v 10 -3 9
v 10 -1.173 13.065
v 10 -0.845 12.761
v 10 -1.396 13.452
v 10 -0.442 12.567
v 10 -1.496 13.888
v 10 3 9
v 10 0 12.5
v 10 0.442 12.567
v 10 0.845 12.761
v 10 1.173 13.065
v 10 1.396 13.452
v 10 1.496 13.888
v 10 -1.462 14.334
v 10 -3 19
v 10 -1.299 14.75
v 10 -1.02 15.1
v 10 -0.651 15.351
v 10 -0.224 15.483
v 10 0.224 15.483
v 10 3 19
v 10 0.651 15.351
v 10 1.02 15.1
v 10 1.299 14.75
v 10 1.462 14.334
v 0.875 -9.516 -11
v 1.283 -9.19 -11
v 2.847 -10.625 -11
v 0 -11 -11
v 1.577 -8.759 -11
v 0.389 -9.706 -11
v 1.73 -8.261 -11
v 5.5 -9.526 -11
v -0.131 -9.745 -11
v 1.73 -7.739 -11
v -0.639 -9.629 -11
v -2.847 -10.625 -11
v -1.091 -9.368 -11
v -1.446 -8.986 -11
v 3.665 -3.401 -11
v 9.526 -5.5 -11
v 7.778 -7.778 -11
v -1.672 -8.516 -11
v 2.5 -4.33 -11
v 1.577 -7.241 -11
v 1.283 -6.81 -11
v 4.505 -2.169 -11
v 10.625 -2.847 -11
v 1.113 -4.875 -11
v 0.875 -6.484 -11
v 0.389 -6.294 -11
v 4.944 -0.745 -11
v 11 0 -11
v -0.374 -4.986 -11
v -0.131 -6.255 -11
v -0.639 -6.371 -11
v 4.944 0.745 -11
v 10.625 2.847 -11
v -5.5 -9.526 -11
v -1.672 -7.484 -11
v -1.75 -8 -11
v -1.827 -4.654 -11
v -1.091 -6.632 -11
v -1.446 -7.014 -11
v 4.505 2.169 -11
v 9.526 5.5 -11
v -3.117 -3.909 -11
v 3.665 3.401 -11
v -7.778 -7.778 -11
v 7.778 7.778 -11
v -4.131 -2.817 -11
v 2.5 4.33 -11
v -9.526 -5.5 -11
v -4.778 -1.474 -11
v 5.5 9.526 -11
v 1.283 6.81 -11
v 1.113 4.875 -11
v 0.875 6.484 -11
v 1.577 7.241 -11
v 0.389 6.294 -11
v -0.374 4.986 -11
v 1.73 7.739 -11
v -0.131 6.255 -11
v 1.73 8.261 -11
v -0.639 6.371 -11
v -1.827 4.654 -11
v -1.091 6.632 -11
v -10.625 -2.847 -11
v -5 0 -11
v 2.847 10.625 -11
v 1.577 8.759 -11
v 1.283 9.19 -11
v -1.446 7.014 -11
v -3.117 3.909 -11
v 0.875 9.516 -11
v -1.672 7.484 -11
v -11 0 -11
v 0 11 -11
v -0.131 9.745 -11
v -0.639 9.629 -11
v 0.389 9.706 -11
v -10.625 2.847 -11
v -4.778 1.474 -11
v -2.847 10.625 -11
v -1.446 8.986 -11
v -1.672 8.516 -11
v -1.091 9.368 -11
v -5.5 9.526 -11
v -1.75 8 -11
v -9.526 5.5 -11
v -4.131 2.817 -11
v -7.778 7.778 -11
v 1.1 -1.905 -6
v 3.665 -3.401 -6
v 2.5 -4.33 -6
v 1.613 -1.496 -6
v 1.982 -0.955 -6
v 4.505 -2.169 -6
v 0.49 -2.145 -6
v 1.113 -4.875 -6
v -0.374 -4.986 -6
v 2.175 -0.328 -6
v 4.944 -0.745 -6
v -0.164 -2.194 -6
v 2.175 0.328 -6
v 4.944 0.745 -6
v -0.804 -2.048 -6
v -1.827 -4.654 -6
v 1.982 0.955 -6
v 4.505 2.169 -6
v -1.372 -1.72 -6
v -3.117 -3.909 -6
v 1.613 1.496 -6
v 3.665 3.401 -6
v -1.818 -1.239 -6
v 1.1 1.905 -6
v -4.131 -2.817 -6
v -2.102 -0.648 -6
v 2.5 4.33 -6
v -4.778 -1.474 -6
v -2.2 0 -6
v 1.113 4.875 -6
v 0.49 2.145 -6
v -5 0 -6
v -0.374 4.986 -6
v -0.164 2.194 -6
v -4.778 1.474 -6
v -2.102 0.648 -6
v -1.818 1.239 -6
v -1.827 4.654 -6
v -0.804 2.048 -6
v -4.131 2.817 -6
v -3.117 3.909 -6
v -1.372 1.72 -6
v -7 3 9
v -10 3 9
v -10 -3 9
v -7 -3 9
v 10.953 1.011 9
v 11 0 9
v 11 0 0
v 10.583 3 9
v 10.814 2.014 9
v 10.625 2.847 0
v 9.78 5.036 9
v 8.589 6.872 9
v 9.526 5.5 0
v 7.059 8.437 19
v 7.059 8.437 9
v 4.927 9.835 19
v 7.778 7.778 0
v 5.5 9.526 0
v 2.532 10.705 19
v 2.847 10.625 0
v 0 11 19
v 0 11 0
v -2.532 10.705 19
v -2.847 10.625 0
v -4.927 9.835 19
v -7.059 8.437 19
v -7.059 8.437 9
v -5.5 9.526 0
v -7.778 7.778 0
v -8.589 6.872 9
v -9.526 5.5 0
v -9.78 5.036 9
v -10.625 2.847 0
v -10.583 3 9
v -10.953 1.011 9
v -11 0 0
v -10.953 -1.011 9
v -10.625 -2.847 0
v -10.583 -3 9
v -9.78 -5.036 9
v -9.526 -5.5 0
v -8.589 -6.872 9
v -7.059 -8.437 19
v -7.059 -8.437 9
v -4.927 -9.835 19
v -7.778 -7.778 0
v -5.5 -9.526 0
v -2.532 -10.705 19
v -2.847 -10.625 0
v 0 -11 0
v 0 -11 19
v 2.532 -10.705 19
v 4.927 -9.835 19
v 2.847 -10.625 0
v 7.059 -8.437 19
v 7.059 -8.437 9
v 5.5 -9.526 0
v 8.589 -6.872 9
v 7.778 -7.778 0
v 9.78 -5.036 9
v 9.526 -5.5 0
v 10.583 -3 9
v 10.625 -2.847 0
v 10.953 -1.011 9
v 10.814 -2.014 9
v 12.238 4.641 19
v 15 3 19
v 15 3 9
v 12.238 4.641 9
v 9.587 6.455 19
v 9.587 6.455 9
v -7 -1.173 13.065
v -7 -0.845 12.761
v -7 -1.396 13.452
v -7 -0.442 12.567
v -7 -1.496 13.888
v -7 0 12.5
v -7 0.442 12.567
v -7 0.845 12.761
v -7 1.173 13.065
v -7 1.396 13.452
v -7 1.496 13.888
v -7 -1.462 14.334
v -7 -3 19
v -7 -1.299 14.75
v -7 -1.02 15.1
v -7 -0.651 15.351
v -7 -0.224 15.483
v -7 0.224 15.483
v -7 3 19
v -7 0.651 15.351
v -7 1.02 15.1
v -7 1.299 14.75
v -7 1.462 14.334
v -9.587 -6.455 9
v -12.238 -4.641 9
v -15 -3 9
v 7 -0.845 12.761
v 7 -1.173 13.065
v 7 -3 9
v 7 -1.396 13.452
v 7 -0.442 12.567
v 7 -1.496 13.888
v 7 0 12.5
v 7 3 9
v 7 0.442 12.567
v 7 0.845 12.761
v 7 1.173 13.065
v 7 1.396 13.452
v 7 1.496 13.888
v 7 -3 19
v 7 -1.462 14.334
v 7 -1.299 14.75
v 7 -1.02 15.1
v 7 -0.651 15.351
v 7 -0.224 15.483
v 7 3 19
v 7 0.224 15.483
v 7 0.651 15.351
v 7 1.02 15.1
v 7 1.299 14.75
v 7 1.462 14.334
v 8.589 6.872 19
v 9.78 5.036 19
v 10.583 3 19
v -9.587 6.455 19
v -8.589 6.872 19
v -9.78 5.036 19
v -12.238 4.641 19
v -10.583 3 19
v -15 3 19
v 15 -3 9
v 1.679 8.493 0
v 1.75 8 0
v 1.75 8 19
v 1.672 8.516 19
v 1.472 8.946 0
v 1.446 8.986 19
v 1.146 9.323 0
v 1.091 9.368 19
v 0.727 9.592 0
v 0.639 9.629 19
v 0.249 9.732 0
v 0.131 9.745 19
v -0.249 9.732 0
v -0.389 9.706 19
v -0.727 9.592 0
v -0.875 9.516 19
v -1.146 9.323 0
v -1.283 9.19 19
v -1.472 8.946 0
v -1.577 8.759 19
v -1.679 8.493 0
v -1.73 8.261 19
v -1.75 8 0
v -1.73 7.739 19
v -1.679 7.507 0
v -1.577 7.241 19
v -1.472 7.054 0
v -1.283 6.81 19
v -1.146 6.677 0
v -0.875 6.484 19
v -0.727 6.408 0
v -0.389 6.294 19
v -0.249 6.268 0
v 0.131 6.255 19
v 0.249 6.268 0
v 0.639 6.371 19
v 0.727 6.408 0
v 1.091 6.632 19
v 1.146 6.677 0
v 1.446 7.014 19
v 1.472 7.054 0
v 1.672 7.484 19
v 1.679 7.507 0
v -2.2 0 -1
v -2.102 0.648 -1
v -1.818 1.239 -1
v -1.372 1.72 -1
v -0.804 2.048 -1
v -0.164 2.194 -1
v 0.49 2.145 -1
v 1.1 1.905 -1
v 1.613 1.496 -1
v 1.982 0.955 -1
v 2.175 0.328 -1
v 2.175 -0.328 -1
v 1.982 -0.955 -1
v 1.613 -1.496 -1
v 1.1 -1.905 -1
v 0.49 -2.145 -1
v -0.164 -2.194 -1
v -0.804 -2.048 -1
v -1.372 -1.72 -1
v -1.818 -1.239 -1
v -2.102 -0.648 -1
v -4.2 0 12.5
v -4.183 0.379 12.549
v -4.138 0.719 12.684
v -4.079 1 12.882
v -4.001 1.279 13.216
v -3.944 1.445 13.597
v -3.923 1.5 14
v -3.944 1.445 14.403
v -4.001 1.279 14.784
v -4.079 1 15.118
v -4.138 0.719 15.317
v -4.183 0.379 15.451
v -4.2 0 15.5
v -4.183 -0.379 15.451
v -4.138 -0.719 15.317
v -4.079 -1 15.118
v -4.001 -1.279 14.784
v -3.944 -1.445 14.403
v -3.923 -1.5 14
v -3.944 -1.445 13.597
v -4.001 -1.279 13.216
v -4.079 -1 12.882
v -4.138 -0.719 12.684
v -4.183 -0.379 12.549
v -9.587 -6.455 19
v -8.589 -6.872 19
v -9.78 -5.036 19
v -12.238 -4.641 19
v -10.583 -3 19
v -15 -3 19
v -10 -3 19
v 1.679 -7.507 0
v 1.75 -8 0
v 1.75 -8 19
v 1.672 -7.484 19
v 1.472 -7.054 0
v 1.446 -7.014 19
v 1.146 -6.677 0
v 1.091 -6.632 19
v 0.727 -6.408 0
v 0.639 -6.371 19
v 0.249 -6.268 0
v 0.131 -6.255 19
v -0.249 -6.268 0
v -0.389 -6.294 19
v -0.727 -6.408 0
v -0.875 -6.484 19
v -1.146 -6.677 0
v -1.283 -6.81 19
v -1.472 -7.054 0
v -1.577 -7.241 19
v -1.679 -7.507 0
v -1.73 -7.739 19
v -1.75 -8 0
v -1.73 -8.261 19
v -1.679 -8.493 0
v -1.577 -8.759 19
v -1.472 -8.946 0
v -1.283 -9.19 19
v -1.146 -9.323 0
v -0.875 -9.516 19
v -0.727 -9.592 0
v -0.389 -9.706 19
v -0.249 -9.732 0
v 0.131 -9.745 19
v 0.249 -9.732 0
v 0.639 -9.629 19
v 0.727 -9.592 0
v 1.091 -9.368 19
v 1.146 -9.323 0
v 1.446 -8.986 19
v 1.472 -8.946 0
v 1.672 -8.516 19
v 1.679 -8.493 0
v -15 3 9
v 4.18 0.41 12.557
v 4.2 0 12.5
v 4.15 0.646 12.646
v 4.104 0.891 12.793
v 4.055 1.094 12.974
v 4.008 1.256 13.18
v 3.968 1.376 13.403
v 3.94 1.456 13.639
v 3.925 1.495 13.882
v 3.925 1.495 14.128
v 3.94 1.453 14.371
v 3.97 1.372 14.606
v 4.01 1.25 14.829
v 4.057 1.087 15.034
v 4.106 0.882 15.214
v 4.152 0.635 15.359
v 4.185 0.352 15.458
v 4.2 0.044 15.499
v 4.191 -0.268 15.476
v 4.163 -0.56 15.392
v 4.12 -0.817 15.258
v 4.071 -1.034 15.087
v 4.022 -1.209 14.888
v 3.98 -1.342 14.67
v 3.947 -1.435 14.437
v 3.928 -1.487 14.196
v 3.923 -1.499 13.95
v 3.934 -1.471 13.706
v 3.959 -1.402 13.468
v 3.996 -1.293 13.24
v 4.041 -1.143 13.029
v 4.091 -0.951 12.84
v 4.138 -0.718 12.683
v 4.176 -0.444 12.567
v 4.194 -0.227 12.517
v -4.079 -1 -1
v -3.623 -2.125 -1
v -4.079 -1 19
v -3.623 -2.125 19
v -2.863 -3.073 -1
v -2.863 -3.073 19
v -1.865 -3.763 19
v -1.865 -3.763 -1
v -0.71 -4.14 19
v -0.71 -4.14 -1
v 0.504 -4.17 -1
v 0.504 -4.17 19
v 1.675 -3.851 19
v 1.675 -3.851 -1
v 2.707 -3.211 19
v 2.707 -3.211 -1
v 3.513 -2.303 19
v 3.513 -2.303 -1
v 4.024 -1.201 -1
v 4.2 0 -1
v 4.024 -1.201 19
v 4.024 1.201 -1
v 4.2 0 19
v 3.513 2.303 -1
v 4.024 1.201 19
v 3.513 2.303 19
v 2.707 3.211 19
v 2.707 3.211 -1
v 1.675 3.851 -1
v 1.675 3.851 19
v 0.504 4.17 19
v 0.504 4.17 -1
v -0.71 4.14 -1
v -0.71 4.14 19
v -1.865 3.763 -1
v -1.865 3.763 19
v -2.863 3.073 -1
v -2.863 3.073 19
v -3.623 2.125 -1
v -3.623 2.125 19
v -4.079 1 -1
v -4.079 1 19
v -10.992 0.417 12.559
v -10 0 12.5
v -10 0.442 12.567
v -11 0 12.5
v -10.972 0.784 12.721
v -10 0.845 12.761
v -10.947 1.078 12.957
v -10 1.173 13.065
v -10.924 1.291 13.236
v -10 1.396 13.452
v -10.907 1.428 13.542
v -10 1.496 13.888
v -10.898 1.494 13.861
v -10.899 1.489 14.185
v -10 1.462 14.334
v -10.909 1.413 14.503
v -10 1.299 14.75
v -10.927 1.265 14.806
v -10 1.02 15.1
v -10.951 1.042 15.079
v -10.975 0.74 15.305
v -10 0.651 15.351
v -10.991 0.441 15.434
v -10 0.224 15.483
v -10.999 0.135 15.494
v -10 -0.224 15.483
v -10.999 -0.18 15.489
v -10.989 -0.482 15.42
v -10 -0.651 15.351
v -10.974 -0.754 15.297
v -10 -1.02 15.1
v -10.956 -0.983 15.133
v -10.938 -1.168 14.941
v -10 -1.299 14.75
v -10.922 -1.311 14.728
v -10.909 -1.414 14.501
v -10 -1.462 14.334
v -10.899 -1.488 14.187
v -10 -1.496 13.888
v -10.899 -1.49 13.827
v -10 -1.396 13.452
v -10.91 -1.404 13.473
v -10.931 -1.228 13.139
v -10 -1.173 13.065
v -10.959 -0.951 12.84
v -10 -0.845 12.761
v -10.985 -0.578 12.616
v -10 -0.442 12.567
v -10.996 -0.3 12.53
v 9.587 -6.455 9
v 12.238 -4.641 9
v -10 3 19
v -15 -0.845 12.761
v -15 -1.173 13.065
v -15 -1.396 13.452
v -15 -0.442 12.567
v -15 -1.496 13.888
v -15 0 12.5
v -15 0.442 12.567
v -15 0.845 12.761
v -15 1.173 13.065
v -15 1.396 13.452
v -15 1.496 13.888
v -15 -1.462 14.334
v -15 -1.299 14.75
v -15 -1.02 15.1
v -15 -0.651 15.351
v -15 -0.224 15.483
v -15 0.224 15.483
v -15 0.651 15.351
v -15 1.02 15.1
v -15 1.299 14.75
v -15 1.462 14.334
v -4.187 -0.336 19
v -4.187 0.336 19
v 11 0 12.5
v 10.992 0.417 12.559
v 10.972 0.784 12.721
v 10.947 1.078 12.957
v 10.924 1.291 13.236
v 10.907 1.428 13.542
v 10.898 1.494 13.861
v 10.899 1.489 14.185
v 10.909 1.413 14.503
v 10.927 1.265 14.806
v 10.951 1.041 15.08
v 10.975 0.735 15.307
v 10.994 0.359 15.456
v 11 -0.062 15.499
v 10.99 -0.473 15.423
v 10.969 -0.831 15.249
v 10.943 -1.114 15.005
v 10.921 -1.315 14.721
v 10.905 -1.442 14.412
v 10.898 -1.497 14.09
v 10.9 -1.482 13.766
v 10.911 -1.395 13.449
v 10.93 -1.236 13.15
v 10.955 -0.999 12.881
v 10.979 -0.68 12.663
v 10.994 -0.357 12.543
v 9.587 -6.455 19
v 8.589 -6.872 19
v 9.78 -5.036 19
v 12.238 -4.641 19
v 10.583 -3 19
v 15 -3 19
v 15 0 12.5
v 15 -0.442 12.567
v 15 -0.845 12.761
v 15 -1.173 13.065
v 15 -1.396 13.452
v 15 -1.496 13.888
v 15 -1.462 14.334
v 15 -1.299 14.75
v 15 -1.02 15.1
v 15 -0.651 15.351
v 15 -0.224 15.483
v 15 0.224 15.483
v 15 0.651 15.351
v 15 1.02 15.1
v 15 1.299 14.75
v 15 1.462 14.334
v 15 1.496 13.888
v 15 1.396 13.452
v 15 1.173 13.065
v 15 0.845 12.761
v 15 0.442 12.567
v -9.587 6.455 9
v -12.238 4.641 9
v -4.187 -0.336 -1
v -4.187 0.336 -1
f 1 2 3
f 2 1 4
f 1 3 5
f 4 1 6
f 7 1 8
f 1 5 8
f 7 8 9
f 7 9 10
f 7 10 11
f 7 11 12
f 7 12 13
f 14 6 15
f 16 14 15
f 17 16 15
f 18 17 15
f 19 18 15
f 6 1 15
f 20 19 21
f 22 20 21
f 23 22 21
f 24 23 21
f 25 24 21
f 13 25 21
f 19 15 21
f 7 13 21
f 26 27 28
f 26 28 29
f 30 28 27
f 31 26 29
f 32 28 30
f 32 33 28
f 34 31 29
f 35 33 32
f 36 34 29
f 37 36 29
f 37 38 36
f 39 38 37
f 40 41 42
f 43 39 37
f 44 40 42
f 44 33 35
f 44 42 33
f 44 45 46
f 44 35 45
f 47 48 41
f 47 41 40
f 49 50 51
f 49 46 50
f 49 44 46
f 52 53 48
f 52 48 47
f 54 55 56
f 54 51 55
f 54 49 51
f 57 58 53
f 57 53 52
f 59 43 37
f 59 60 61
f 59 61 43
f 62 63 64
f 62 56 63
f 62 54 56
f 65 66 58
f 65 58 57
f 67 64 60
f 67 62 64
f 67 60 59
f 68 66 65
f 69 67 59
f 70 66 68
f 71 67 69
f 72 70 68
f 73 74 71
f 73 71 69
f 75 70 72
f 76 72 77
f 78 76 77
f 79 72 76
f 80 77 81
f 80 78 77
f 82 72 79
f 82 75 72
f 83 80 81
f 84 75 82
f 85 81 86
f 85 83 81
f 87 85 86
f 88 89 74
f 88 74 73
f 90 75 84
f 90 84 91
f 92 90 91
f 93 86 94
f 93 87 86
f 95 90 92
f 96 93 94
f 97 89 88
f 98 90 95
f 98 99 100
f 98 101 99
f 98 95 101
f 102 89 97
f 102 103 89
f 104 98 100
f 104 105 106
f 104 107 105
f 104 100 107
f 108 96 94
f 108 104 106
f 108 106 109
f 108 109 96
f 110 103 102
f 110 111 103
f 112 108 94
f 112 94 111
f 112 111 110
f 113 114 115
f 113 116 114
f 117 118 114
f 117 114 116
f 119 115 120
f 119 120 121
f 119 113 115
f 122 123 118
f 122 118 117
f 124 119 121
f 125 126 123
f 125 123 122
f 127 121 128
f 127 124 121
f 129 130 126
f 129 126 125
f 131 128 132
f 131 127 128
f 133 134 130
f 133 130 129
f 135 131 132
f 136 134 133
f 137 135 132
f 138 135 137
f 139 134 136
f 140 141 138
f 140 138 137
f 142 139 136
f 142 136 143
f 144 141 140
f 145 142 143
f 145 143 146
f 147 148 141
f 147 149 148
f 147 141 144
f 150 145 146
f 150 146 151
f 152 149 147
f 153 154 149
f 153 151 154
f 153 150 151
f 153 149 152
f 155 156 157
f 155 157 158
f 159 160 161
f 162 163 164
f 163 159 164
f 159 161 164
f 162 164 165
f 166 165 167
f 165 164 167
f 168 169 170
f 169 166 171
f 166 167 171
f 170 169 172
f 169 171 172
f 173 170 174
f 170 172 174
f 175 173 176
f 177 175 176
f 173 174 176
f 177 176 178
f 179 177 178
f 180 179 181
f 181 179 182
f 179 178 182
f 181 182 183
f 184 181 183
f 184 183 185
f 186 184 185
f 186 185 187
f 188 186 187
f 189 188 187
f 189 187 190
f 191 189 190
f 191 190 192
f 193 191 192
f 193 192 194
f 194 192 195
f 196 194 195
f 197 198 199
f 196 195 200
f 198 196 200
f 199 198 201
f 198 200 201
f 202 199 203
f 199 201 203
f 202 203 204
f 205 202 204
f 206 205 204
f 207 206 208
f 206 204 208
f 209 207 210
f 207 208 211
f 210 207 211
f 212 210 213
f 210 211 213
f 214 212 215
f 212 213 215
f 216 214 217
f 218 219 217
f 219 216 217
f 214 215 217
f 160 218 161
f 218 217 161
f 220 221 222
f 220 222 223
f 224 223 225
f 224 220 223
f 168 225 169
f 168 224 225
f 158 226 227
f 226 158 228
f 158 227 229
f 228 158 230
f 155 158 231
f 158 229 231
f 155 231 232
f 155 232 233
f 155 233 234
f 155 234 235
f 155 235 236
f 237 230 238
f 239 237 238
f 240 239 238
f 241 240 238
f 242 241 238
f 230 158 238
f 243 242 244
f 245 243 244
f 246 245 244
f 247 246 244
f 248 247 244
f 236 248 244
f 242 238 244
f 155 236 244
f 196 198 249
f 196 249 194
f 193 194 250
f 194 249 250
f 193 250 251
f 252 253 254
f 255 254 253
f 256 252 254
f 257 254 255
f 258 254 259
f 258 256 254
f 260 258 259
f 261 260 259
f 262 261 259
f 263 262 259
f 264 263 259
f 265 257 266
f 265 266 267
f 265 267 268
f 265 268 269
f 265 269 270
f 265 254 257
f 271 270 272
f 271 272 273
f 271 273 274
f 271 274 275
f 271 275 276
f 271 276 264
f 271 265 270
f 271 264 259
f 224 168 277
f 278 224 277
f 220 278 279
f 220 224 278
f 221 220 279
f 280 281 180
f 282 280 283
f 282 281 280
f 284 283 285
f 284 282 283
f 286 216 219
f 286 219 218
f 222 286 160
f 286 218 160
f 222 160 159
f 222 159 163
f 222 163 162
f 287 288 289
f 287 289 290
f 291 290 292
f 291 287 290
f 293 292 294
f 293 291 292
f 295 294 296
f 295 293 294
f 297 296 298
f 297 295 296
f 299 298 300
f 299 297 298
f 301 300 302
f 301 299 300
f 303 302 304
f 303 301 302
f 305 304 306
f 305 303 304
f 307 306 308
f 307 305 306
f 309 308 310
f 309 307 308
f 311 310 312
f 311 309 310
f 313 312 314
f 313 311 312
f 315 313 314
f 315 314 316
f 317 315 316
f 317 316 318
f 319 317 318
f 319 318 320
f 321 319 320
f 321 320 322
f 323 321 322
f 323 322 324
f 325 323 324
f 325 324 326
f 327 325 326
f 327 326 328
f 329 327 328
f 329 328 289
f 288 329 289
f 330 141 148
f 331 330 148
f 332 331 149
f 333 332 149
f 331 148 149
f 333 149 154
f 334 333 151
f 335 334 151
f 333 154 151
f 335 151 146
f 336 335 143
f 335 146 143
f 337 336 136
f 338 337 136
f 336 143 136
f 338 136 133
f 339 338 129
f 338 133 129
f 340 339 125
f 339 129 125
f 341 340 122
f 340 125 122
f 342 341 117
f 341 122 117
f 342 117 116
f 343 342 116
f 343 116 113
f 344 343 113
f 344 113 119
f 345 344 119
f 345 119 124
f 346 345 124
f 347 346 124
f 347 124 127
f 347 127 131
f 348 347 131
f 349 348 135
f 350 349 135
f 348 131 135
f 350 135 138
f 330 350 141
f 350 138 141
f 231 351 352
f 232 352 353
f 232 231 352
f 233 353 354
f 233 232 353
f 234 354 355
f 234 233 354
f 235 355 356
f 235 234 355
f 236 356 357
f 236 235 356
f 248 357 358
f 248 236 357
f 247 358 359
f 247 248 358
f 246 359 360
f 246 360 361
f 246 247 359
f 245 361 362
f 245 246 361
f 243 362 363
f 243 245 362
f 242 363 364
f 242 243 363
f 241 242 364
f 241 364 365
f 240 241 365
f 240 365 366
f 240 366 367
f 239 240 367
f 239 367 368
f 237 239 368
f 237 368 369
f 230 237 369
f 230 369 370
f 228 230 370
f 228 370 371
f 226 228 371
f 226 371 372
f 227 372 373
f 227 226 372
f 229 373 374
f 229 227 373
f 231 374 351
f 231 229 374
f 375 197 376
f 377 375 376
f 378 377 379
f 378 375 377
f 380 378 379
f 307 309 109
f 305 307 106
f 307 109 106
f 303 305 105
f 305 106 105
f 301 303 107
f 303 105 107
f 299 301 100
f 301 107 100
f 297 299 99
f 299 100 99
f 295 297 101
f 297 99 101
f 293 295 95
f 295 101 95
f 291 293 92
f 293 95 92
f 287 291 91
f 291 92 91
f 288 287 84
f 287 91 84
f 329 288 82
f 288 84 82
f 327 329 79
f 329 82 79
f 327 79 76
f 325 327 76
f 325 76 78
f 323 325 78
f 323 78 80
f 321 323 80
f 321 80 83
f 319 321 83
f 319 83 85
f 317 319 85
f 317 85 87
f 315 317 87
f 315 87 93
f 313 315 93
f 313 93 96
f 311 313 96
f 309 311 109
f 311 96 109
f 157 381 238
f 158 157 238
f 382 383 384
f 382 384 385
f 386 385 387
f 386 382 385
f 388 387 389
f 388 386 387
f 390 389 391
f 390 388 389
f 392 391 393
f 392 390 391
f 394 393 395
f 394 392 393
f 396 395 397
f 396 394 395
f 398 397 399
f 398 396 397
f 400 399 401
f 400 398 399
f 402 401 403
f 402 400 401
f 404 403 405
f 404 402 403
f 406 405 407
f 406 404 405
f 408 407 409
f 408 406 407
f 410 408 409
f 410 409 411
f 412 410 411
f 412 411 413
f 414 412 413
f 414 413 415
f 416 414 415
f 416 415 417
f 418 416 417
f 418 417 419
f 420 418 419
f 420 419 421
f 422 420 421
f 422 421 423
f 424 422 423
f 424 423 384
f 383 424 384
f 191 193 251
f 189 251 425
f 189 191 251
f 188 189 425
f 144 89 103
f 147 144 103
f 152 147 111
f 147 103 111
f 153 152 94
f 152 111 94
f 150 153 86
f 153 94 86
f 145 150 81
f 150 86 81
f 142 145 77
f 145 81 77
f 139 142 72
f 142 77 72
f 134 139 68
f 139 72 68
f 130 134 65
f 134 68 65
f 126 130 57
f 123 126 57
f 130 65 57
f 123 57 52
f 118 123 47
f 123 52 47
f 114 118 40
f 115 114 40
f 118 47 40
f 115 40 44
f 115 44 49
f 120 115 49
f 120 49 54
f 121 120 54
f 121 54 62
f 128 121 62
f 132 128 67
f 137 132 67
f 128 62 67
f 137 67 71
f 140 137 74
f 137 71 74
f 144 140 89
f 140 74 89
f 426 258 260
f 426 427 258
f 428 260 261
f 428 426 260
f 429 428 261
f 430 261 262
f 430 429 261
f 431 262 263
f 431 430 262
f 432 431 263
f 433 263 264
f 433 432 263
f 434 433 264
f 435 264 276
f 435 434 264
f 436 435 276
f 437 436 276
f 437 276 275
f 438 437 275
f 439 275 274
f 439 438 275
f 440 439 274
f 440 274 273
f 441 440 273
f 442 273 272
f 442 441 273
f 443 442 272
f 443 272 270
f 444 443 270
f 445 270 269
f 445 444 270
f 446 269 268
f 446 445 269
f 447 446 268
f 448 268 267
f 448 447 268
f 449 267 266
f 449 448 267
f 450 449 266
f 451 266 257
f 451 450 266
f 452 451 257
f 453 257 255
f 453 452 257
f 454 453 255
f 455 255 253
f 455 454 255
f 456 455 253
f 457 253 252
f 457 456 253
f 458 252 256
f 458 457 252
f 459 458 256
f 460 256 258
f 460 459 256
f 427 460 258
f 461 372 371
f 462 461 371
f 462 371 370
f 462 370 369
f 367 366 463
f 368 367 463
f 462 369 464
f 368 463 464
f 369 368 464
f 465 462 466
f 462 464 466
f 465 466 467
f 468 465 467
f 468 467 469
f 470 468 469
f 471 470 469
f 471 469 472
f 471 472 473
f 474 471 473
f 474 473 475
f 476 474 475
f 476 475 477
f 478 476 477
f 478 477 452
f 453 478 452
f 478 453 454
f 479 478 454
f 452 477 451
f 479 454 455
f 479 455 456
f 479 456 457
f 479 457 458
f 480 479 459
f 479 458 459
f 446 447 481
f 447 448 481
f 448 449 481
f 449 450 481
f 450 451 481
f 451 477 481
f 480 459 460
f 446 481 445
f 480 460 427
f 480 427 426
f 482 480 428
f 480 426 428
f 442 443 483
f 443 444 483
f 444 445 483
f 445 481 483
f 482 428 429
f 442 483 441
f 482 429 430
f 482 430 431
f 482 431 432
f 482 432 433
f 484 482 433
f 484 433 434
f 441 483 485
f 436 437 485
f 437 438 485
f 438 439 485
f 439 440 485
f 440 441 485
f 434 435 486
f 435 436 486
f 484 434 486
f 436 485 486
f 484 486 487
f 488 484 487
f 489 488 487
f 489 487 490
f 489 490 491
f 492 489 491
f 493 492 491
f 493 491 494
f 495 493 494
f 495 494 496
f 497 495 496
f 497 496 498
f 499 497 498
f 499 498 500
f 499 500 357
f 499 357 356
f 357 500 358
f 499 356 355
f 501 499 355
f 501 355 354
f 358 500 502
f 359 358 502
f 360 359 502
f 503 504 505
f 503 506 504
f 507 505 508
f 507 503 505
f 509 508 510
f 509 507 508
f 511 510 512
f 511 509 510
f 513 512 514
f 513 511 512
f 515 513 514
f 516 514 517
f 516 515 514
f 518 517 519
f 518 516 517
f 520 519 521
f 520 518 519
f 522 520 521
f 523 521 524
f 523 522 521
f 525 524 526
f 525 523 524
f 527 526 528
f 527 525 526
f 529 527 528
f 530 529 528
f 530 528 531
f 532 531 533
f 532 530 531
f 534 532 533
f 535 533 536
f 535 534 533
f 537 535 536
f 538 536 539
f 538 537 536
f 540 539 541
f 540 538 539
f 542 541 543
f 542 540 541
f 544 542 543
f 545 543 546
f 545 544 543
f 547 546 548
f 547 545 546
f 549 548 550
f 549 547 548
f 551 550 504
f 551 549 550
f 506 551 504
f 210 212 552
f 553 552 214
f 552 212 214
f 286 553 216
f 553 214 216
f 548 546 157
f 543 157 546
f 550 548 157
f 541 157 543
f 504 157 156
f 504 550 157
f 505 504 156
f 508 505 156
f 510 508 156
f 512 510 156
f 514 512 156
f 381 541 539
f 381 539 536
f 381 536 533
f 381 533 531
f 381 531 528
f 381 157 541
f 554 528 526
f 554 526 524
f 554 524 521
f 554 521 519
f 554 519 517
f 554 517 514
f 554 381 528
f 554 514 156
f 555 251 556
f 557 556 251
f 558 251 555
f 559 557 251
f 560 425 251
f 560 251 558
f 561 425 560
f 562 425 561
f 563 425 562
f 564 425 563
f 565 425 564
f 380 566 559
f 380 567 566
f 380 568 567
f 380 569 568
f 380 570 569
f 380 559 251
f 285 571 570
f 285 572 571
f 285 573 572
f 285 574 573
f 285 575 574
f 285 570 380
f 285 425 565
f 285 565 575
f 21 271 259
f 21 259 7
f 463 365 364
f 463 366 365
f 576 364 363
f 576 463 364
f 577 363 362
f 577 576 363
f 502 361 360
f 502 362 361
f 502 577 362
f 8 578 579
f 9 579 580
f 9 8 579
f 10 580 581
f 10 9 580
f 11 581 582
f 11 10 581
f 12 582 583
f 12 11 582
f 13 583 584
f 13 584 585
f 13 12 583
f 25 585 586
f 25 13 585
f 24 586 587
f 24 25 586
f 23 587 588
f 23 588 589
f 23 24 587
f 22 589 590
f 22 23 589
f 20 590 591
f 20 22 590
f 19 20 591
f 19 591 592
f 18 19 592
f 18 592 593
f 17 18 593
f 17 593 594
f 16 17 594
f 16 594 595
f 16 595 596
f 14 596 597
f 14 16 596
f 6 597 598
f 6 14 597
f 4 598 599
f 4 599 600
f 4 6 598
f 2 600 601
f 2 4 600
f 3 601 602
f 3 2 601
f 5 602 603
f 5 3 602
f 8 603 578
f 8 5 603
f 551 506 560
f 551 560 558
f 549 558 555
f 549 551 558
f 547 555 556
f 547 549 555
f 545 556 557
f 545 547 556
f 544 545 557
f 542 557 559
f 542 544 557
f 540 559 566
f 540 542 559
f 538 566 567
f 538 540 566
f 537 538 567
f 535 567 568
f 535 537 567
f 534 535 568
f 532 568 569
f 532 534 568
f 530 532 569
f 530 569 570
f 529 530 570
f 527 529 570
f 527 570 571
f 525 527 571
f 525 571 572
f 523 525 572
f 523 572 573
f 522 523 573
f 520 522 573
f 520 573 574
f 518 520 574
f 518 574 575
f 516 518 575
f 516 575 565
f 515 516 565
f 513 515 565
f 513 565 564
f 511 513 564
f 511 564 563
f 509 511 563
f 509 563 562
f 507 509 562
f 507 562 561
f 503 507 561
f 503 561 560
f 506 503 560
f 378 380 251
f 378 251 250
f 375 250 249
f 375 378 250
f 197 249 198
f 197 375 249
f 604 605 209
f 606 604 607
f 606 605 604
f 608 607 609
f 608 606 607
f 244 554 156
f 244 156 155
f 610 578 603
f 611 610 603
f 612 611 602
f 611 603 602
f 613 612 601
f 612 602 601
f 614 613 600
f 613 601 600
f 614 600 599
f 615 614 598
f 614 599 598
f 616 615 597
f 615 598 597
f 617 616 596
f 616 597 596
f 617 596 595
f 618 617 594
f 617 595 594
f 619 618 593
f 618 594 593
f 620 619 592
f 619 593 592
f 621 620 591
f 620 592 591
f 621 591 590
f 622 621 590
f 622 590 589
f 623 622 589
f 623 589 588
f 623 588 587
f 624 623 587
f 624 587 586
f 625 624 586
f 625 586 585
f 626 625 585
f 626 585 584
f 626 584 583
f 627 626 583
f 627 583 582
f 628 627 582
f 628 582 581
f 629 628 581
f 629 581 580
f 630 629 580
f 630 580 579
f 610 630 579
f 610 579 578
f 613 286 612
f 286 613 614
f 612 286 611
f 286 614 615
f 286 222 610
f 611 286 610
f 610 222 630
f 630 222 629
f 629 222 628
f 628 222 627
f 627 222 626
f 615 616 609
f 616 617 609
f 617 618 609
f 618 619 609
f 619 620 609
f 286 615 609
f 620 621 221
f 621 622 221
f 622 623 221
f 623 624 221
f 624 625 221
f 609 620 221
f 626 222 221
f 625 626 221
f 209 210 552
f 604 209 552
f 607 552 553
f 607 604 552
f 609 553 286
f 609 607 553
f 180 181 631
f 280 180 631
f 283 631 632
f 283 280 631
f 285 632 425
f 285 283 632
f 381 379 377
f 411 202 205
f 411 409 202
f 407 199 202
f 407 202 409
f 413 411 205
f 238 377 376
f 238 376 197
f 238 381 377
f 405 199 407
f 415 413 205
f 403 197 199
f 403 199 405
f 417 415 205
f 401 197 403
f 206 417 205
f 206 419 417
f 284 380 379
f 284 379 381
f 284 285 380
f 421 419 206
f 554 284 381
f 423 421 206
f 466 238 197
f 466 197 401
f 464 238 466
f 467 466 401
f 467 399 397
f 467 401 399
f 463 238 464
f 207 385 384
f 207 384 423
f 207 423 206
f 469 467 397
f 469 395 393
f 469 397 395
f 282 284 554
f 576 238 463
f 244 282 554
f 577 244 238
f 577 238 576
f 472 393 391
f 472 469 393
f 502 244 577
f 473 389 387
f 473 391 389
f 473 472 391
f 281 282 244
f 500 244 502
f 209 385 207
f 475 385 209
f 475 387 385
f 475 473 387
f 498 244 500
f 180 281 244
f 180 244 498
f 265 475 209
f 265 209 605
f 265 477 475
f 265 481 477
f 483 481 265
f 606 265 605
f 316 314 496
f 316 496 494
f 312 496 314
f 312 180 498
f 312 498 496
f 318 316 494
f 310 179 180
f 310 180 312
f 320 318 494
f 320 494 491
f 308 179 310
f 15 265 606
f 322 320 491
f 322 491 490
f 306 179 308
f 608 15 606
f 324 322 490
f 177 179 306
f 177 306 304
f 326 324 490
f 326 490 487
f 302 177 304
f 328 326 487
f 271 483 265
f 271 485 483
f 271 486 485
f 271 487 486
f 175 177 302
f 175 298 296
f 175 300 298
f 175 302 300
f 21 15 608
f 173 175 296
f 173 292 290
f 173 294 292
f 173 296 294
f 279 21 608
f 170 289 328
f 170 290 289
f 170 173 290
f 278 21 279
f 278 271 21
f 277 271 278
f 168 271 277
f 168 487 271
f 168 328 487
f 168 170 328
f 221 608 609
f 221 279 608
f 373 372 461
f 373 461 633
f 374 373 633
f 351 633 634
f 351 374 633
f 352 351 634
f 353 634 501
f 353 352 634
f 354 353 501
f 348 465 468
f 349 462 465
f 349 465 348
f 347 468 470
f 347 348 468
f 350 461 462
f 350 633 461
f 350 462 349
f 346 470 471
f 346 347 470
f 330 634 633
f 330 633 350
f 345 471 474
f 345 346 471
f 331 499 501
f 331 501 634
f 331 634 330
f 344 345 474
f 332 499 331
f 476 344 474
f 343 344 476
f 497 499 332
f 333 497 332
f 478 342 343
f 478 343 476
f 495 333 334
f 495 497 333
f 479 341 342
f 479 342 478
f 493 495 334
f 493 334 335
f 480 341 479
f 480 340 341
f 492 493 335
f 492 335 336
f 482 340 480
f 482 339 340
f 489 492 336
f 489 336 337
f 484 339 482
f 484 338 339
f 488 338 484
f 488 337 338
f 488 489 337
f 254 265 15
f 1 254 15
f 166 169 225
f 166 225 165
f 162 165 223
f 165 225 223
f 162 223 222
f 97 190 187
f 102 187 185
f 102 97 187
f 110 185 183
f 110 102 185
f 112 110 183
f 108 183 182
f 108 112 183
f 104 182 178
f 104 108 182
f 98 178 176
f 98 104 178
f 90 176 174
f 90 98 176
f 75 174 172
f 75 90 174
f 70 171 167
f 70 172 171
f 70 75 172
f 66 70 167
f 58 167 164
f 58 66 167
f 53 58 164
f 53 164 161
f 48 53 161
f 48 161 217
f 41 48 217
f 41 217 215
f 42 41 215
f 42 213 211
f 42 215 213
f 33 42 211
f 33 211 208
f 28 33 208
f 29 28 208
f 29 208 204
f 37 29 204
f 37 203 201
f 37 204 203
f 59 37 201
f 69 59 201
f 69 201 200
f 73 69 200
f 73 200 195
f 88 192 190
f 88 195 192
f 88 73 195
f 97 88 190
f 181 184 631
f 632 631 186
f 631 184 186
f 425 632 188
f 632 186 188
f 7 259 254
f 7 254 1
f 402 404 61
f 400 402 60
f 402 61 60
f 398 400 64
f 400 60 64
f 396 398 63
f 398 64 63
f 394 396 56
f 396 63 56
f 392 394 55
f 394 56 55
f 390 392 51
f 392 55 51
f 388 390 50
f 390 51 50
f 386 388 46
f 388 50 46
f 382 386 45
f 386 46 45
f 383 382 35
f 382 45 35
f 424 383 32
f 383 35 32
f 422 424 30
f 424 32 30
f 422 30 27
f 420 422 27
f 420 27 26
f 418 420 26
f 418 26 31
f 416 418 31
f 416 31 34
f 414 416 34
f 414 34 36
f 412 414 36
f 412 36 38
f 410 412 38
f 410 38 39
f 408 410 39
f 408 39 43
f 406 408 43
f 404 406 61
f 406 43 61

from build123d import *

# Parameters (mm, degrees)
SKETCH1_R               = 11
SKETCH1_R_2             = 1.75
BOSS_EXTRUDE1_DEPTH     = 19
BOSS_EXTRUDE2_START     = 11
SKETCH2_R               = 11
SKETCH2_R_2             = 1.75
BOSS_EXTRUDE2_DEPTH     = 11
CUT_EXTRUDE3_DEPTH      = 20
SKETCH7_R               = 5
CUT_EXTRUDE4_DEPTH      = 5
SKETCH8_R               = 2.2
CUT_EXTRUDE5_DEPTH      = 5
BOSS_EXTRUDE3_DEPTH     = 20
SKETCH11_W              = 3
SKETCH11_H              = 6
CUT_EXTRUDE6_DEPTH      = 10
CUT_EXTRUDE7_DEPTH      = 25.556058316
CUT_EXTRUDE7_DEPTH_BACK = 25.556058316
SKETCH12_R              = 1.5
SKETCH13_W              = 10
SKETCH13_H              = 6
SKETCH13_R              = 1.5
BOSS_EXTRUDE4_DEPTH     = 5
FILLET1_R               = 50


with BuildPart() as part:
    # Sketch1 → Boss-Extrude1 (new body)
    with BuildSketch(Plane.XY):
        Circle(SKETCH1_R)
        with Locations((0, 8)):
            Circle(SKETCH1_R_2, mode=Mode.SUBTRACT)
        with Locations((0, -8)):
            Circle(SKETCH1_R_2, mode=Mode.SUBTRACT)
    extrude(amount=BOSS_EXTRUDE1_DEPTH)

    # Sketch2 → Boss-Extrude2 (add)
    with BuildSketch(Plane(origin=(0, 0, 0), x_dir=(-1, 0, 0), z_dir=(0, 0, -1)).offset(BOSS_EXTRUDE2_START)):
        Circle(SKETCH2_R)
        with Locations((0, 8)):
            Circle(SKETCH2_R_2, mode=Mode.SUBTRACT)
        with Locations((0, -8)):
            Circle(SKETCH2_R_2, mode=Mode.SUBTRACT)
    extrude(amount=-BOSS_EXTRUDE2_DEPTH)

    # Sketch6 → Cut-Extrude3 (cut)
    with BuildSketch(Plane.XY.offset(19)):
        with BuildLine():
            Line((-4.079215611, 1), (-5, 1))
            Line((-5, 1), (-5, -1))
            Line((-5, -1), (-4.079215611, -1))
            ThreePointArc((-4.079215611, -1), (4.2, 0), (-4.079215611, 1))
        make_face()
    extrude(amount=-CUT_EXTRUDE3_DEPTH, mode=Mode.SUBTRACT)

    # Sketch7 → Cut-Extrude4 (cut)
    with BuildSketch(Plane(origin=(0, 0, -11), x_dir=(-1, 0, 0), z_dir=(0, 0, -1))):
        Circle(SKETCH7_R)
    extrude(amount=-CUT_EXTRUDE4_DEPTH, mode=Mode.SUBTRACT)

    # Sketch8 → Cut-Extrude5 (cut)
    with BuildSketch(Plane(origin=(0, 0, -6), x_dir=(-1, 0, 0), z_dir=(0, 0, -1))):
        Circle(SKETCH8_R)
    extrude(amount=-CUT_EXTRUDE5_DEPTH, mode=Mode.SUBTRACT)

    # Sketch9 → Boss-Extrude3 (add)
    with BuildSketch(Plane.XY.offset(19)):
        with BuildLine():
            Line((-5, -1), (-4.079215611, -1))
            ThreePointArc((-4.079215611, -1), (-4.2, 0), (-4.079215611, 1))
            Line((-4.079215611, 1), (-5, 1))
            Line((-5, 1), (-5, -1))
        make_face()
    extrude(amount=-BOSS_EXTRUDE3_DEPTH)

    # Sketch11 → Cut-Extrude6 (cut)
    with BuildSketch(Plane.XY.offset(19)):
        with Locations((-8.5, 0)):
            Rectangle(SKETCH11_W, SKETCH11_H)
        with Locations((8.5, 0)):
            Rectangle(SKETCH11_W, SKETCH11_H)
    extrude(amount=-CUT_EXTRUDE6_DEPTH, mode=Mode.SUBTRACT)

    # Sketch12 → Cut-Extrude7 (cut, two sides: drawn at the far end of the back side and taken through both)
    with BuildSketch(Plane(origin=(0, 0, 0), x_dir=(0, 0, -1), z_dir=(1, 0, 0)).offset(-CUT_EXTRUDE7_DEPTH_BACK)):
        with Locations((-14, 0)):
            Circle(SKETCH12_R)
    extrude(amount=CUT_EXTRUDE7_DEPTH + CUT_EXTRUDE7_DEPTH_BACK, mode=Mode.SUBTRACT)

    # Sketch13 → Boss-Extrude4 (add)
    with BuildSketch(Plane.ZY.offset(-10)):
        with Locations((14, 0)):
            Rectangle(SKETCH13_W, SKETCH13_H)
        with Locations(Location((14, 0, 0), (0, 0, 180))):
            Circle(SKETCH13_R, mode=Mode.SUBTRACT)
    boss_extrude4 = extrude(amount=-BOSS_EXTRUDE4_DEPTH)

    # Mirror1: Boss-Extrude4 across plane
    add(boss_extrude4.mirror(Plane(origin=(0, 0, 0), x_dir=(0, 0, 1), z_dir=(1, 0, 0))))

    # Fillet1
    # the kernel refuses this fillet: 50 mm, written as the material it adds along each edge
    with BuildSketch(Plane(origin=(-10.583005244, -3, 19), x_dir=(0.5439709687724876, -0.8391040371328942, 0), z_dir=(0, 0, -1)), Plane(origin=(10.583005244, 3, 19), x_dir=(-0.5439709687724888, 0.8391040371328933, 0), z_dir=(0, 0, -1))) as fillet1_piece_1:
        with BuildLine():
            CenterArc((21.204232389, 47.782524235), FILLET1_R, 241.826767434, 11.045481443)
            Line((-2.402716916, 3.706318132), (0, 0))
            ThreePointArc((0, 0), (3.239535504, 0.487844668), (6.479071008, 0))
        make_face()
    extrude(amount=10)
    with BuildSketch(Plane(origin=(-10.583005244, 3, 19), x_dir=(0.5439709687724879, 0.839104037132894, 0), z_dir=(0, 0, -1)), Plane(origin=(10.583005244, -3, 19), x_dir=(-0.5439709687724888, -0.8391040371328933, 0), z_dir=(0, 0, -1))) as fillet1_piece_2:
        with BuildLine():
            CenterArc((21.204232389, -47.782524235), FILLET1_R, 107.127751124, 11.045481443)
            Line((-2.402716916, -3.706318132), (0, 0))
            ThreePointArc((0, 0), (3.239535504, -0.487844668), (6.479071008, 0))
        make_face()
    extrude(amount=10)


solid = part.part
